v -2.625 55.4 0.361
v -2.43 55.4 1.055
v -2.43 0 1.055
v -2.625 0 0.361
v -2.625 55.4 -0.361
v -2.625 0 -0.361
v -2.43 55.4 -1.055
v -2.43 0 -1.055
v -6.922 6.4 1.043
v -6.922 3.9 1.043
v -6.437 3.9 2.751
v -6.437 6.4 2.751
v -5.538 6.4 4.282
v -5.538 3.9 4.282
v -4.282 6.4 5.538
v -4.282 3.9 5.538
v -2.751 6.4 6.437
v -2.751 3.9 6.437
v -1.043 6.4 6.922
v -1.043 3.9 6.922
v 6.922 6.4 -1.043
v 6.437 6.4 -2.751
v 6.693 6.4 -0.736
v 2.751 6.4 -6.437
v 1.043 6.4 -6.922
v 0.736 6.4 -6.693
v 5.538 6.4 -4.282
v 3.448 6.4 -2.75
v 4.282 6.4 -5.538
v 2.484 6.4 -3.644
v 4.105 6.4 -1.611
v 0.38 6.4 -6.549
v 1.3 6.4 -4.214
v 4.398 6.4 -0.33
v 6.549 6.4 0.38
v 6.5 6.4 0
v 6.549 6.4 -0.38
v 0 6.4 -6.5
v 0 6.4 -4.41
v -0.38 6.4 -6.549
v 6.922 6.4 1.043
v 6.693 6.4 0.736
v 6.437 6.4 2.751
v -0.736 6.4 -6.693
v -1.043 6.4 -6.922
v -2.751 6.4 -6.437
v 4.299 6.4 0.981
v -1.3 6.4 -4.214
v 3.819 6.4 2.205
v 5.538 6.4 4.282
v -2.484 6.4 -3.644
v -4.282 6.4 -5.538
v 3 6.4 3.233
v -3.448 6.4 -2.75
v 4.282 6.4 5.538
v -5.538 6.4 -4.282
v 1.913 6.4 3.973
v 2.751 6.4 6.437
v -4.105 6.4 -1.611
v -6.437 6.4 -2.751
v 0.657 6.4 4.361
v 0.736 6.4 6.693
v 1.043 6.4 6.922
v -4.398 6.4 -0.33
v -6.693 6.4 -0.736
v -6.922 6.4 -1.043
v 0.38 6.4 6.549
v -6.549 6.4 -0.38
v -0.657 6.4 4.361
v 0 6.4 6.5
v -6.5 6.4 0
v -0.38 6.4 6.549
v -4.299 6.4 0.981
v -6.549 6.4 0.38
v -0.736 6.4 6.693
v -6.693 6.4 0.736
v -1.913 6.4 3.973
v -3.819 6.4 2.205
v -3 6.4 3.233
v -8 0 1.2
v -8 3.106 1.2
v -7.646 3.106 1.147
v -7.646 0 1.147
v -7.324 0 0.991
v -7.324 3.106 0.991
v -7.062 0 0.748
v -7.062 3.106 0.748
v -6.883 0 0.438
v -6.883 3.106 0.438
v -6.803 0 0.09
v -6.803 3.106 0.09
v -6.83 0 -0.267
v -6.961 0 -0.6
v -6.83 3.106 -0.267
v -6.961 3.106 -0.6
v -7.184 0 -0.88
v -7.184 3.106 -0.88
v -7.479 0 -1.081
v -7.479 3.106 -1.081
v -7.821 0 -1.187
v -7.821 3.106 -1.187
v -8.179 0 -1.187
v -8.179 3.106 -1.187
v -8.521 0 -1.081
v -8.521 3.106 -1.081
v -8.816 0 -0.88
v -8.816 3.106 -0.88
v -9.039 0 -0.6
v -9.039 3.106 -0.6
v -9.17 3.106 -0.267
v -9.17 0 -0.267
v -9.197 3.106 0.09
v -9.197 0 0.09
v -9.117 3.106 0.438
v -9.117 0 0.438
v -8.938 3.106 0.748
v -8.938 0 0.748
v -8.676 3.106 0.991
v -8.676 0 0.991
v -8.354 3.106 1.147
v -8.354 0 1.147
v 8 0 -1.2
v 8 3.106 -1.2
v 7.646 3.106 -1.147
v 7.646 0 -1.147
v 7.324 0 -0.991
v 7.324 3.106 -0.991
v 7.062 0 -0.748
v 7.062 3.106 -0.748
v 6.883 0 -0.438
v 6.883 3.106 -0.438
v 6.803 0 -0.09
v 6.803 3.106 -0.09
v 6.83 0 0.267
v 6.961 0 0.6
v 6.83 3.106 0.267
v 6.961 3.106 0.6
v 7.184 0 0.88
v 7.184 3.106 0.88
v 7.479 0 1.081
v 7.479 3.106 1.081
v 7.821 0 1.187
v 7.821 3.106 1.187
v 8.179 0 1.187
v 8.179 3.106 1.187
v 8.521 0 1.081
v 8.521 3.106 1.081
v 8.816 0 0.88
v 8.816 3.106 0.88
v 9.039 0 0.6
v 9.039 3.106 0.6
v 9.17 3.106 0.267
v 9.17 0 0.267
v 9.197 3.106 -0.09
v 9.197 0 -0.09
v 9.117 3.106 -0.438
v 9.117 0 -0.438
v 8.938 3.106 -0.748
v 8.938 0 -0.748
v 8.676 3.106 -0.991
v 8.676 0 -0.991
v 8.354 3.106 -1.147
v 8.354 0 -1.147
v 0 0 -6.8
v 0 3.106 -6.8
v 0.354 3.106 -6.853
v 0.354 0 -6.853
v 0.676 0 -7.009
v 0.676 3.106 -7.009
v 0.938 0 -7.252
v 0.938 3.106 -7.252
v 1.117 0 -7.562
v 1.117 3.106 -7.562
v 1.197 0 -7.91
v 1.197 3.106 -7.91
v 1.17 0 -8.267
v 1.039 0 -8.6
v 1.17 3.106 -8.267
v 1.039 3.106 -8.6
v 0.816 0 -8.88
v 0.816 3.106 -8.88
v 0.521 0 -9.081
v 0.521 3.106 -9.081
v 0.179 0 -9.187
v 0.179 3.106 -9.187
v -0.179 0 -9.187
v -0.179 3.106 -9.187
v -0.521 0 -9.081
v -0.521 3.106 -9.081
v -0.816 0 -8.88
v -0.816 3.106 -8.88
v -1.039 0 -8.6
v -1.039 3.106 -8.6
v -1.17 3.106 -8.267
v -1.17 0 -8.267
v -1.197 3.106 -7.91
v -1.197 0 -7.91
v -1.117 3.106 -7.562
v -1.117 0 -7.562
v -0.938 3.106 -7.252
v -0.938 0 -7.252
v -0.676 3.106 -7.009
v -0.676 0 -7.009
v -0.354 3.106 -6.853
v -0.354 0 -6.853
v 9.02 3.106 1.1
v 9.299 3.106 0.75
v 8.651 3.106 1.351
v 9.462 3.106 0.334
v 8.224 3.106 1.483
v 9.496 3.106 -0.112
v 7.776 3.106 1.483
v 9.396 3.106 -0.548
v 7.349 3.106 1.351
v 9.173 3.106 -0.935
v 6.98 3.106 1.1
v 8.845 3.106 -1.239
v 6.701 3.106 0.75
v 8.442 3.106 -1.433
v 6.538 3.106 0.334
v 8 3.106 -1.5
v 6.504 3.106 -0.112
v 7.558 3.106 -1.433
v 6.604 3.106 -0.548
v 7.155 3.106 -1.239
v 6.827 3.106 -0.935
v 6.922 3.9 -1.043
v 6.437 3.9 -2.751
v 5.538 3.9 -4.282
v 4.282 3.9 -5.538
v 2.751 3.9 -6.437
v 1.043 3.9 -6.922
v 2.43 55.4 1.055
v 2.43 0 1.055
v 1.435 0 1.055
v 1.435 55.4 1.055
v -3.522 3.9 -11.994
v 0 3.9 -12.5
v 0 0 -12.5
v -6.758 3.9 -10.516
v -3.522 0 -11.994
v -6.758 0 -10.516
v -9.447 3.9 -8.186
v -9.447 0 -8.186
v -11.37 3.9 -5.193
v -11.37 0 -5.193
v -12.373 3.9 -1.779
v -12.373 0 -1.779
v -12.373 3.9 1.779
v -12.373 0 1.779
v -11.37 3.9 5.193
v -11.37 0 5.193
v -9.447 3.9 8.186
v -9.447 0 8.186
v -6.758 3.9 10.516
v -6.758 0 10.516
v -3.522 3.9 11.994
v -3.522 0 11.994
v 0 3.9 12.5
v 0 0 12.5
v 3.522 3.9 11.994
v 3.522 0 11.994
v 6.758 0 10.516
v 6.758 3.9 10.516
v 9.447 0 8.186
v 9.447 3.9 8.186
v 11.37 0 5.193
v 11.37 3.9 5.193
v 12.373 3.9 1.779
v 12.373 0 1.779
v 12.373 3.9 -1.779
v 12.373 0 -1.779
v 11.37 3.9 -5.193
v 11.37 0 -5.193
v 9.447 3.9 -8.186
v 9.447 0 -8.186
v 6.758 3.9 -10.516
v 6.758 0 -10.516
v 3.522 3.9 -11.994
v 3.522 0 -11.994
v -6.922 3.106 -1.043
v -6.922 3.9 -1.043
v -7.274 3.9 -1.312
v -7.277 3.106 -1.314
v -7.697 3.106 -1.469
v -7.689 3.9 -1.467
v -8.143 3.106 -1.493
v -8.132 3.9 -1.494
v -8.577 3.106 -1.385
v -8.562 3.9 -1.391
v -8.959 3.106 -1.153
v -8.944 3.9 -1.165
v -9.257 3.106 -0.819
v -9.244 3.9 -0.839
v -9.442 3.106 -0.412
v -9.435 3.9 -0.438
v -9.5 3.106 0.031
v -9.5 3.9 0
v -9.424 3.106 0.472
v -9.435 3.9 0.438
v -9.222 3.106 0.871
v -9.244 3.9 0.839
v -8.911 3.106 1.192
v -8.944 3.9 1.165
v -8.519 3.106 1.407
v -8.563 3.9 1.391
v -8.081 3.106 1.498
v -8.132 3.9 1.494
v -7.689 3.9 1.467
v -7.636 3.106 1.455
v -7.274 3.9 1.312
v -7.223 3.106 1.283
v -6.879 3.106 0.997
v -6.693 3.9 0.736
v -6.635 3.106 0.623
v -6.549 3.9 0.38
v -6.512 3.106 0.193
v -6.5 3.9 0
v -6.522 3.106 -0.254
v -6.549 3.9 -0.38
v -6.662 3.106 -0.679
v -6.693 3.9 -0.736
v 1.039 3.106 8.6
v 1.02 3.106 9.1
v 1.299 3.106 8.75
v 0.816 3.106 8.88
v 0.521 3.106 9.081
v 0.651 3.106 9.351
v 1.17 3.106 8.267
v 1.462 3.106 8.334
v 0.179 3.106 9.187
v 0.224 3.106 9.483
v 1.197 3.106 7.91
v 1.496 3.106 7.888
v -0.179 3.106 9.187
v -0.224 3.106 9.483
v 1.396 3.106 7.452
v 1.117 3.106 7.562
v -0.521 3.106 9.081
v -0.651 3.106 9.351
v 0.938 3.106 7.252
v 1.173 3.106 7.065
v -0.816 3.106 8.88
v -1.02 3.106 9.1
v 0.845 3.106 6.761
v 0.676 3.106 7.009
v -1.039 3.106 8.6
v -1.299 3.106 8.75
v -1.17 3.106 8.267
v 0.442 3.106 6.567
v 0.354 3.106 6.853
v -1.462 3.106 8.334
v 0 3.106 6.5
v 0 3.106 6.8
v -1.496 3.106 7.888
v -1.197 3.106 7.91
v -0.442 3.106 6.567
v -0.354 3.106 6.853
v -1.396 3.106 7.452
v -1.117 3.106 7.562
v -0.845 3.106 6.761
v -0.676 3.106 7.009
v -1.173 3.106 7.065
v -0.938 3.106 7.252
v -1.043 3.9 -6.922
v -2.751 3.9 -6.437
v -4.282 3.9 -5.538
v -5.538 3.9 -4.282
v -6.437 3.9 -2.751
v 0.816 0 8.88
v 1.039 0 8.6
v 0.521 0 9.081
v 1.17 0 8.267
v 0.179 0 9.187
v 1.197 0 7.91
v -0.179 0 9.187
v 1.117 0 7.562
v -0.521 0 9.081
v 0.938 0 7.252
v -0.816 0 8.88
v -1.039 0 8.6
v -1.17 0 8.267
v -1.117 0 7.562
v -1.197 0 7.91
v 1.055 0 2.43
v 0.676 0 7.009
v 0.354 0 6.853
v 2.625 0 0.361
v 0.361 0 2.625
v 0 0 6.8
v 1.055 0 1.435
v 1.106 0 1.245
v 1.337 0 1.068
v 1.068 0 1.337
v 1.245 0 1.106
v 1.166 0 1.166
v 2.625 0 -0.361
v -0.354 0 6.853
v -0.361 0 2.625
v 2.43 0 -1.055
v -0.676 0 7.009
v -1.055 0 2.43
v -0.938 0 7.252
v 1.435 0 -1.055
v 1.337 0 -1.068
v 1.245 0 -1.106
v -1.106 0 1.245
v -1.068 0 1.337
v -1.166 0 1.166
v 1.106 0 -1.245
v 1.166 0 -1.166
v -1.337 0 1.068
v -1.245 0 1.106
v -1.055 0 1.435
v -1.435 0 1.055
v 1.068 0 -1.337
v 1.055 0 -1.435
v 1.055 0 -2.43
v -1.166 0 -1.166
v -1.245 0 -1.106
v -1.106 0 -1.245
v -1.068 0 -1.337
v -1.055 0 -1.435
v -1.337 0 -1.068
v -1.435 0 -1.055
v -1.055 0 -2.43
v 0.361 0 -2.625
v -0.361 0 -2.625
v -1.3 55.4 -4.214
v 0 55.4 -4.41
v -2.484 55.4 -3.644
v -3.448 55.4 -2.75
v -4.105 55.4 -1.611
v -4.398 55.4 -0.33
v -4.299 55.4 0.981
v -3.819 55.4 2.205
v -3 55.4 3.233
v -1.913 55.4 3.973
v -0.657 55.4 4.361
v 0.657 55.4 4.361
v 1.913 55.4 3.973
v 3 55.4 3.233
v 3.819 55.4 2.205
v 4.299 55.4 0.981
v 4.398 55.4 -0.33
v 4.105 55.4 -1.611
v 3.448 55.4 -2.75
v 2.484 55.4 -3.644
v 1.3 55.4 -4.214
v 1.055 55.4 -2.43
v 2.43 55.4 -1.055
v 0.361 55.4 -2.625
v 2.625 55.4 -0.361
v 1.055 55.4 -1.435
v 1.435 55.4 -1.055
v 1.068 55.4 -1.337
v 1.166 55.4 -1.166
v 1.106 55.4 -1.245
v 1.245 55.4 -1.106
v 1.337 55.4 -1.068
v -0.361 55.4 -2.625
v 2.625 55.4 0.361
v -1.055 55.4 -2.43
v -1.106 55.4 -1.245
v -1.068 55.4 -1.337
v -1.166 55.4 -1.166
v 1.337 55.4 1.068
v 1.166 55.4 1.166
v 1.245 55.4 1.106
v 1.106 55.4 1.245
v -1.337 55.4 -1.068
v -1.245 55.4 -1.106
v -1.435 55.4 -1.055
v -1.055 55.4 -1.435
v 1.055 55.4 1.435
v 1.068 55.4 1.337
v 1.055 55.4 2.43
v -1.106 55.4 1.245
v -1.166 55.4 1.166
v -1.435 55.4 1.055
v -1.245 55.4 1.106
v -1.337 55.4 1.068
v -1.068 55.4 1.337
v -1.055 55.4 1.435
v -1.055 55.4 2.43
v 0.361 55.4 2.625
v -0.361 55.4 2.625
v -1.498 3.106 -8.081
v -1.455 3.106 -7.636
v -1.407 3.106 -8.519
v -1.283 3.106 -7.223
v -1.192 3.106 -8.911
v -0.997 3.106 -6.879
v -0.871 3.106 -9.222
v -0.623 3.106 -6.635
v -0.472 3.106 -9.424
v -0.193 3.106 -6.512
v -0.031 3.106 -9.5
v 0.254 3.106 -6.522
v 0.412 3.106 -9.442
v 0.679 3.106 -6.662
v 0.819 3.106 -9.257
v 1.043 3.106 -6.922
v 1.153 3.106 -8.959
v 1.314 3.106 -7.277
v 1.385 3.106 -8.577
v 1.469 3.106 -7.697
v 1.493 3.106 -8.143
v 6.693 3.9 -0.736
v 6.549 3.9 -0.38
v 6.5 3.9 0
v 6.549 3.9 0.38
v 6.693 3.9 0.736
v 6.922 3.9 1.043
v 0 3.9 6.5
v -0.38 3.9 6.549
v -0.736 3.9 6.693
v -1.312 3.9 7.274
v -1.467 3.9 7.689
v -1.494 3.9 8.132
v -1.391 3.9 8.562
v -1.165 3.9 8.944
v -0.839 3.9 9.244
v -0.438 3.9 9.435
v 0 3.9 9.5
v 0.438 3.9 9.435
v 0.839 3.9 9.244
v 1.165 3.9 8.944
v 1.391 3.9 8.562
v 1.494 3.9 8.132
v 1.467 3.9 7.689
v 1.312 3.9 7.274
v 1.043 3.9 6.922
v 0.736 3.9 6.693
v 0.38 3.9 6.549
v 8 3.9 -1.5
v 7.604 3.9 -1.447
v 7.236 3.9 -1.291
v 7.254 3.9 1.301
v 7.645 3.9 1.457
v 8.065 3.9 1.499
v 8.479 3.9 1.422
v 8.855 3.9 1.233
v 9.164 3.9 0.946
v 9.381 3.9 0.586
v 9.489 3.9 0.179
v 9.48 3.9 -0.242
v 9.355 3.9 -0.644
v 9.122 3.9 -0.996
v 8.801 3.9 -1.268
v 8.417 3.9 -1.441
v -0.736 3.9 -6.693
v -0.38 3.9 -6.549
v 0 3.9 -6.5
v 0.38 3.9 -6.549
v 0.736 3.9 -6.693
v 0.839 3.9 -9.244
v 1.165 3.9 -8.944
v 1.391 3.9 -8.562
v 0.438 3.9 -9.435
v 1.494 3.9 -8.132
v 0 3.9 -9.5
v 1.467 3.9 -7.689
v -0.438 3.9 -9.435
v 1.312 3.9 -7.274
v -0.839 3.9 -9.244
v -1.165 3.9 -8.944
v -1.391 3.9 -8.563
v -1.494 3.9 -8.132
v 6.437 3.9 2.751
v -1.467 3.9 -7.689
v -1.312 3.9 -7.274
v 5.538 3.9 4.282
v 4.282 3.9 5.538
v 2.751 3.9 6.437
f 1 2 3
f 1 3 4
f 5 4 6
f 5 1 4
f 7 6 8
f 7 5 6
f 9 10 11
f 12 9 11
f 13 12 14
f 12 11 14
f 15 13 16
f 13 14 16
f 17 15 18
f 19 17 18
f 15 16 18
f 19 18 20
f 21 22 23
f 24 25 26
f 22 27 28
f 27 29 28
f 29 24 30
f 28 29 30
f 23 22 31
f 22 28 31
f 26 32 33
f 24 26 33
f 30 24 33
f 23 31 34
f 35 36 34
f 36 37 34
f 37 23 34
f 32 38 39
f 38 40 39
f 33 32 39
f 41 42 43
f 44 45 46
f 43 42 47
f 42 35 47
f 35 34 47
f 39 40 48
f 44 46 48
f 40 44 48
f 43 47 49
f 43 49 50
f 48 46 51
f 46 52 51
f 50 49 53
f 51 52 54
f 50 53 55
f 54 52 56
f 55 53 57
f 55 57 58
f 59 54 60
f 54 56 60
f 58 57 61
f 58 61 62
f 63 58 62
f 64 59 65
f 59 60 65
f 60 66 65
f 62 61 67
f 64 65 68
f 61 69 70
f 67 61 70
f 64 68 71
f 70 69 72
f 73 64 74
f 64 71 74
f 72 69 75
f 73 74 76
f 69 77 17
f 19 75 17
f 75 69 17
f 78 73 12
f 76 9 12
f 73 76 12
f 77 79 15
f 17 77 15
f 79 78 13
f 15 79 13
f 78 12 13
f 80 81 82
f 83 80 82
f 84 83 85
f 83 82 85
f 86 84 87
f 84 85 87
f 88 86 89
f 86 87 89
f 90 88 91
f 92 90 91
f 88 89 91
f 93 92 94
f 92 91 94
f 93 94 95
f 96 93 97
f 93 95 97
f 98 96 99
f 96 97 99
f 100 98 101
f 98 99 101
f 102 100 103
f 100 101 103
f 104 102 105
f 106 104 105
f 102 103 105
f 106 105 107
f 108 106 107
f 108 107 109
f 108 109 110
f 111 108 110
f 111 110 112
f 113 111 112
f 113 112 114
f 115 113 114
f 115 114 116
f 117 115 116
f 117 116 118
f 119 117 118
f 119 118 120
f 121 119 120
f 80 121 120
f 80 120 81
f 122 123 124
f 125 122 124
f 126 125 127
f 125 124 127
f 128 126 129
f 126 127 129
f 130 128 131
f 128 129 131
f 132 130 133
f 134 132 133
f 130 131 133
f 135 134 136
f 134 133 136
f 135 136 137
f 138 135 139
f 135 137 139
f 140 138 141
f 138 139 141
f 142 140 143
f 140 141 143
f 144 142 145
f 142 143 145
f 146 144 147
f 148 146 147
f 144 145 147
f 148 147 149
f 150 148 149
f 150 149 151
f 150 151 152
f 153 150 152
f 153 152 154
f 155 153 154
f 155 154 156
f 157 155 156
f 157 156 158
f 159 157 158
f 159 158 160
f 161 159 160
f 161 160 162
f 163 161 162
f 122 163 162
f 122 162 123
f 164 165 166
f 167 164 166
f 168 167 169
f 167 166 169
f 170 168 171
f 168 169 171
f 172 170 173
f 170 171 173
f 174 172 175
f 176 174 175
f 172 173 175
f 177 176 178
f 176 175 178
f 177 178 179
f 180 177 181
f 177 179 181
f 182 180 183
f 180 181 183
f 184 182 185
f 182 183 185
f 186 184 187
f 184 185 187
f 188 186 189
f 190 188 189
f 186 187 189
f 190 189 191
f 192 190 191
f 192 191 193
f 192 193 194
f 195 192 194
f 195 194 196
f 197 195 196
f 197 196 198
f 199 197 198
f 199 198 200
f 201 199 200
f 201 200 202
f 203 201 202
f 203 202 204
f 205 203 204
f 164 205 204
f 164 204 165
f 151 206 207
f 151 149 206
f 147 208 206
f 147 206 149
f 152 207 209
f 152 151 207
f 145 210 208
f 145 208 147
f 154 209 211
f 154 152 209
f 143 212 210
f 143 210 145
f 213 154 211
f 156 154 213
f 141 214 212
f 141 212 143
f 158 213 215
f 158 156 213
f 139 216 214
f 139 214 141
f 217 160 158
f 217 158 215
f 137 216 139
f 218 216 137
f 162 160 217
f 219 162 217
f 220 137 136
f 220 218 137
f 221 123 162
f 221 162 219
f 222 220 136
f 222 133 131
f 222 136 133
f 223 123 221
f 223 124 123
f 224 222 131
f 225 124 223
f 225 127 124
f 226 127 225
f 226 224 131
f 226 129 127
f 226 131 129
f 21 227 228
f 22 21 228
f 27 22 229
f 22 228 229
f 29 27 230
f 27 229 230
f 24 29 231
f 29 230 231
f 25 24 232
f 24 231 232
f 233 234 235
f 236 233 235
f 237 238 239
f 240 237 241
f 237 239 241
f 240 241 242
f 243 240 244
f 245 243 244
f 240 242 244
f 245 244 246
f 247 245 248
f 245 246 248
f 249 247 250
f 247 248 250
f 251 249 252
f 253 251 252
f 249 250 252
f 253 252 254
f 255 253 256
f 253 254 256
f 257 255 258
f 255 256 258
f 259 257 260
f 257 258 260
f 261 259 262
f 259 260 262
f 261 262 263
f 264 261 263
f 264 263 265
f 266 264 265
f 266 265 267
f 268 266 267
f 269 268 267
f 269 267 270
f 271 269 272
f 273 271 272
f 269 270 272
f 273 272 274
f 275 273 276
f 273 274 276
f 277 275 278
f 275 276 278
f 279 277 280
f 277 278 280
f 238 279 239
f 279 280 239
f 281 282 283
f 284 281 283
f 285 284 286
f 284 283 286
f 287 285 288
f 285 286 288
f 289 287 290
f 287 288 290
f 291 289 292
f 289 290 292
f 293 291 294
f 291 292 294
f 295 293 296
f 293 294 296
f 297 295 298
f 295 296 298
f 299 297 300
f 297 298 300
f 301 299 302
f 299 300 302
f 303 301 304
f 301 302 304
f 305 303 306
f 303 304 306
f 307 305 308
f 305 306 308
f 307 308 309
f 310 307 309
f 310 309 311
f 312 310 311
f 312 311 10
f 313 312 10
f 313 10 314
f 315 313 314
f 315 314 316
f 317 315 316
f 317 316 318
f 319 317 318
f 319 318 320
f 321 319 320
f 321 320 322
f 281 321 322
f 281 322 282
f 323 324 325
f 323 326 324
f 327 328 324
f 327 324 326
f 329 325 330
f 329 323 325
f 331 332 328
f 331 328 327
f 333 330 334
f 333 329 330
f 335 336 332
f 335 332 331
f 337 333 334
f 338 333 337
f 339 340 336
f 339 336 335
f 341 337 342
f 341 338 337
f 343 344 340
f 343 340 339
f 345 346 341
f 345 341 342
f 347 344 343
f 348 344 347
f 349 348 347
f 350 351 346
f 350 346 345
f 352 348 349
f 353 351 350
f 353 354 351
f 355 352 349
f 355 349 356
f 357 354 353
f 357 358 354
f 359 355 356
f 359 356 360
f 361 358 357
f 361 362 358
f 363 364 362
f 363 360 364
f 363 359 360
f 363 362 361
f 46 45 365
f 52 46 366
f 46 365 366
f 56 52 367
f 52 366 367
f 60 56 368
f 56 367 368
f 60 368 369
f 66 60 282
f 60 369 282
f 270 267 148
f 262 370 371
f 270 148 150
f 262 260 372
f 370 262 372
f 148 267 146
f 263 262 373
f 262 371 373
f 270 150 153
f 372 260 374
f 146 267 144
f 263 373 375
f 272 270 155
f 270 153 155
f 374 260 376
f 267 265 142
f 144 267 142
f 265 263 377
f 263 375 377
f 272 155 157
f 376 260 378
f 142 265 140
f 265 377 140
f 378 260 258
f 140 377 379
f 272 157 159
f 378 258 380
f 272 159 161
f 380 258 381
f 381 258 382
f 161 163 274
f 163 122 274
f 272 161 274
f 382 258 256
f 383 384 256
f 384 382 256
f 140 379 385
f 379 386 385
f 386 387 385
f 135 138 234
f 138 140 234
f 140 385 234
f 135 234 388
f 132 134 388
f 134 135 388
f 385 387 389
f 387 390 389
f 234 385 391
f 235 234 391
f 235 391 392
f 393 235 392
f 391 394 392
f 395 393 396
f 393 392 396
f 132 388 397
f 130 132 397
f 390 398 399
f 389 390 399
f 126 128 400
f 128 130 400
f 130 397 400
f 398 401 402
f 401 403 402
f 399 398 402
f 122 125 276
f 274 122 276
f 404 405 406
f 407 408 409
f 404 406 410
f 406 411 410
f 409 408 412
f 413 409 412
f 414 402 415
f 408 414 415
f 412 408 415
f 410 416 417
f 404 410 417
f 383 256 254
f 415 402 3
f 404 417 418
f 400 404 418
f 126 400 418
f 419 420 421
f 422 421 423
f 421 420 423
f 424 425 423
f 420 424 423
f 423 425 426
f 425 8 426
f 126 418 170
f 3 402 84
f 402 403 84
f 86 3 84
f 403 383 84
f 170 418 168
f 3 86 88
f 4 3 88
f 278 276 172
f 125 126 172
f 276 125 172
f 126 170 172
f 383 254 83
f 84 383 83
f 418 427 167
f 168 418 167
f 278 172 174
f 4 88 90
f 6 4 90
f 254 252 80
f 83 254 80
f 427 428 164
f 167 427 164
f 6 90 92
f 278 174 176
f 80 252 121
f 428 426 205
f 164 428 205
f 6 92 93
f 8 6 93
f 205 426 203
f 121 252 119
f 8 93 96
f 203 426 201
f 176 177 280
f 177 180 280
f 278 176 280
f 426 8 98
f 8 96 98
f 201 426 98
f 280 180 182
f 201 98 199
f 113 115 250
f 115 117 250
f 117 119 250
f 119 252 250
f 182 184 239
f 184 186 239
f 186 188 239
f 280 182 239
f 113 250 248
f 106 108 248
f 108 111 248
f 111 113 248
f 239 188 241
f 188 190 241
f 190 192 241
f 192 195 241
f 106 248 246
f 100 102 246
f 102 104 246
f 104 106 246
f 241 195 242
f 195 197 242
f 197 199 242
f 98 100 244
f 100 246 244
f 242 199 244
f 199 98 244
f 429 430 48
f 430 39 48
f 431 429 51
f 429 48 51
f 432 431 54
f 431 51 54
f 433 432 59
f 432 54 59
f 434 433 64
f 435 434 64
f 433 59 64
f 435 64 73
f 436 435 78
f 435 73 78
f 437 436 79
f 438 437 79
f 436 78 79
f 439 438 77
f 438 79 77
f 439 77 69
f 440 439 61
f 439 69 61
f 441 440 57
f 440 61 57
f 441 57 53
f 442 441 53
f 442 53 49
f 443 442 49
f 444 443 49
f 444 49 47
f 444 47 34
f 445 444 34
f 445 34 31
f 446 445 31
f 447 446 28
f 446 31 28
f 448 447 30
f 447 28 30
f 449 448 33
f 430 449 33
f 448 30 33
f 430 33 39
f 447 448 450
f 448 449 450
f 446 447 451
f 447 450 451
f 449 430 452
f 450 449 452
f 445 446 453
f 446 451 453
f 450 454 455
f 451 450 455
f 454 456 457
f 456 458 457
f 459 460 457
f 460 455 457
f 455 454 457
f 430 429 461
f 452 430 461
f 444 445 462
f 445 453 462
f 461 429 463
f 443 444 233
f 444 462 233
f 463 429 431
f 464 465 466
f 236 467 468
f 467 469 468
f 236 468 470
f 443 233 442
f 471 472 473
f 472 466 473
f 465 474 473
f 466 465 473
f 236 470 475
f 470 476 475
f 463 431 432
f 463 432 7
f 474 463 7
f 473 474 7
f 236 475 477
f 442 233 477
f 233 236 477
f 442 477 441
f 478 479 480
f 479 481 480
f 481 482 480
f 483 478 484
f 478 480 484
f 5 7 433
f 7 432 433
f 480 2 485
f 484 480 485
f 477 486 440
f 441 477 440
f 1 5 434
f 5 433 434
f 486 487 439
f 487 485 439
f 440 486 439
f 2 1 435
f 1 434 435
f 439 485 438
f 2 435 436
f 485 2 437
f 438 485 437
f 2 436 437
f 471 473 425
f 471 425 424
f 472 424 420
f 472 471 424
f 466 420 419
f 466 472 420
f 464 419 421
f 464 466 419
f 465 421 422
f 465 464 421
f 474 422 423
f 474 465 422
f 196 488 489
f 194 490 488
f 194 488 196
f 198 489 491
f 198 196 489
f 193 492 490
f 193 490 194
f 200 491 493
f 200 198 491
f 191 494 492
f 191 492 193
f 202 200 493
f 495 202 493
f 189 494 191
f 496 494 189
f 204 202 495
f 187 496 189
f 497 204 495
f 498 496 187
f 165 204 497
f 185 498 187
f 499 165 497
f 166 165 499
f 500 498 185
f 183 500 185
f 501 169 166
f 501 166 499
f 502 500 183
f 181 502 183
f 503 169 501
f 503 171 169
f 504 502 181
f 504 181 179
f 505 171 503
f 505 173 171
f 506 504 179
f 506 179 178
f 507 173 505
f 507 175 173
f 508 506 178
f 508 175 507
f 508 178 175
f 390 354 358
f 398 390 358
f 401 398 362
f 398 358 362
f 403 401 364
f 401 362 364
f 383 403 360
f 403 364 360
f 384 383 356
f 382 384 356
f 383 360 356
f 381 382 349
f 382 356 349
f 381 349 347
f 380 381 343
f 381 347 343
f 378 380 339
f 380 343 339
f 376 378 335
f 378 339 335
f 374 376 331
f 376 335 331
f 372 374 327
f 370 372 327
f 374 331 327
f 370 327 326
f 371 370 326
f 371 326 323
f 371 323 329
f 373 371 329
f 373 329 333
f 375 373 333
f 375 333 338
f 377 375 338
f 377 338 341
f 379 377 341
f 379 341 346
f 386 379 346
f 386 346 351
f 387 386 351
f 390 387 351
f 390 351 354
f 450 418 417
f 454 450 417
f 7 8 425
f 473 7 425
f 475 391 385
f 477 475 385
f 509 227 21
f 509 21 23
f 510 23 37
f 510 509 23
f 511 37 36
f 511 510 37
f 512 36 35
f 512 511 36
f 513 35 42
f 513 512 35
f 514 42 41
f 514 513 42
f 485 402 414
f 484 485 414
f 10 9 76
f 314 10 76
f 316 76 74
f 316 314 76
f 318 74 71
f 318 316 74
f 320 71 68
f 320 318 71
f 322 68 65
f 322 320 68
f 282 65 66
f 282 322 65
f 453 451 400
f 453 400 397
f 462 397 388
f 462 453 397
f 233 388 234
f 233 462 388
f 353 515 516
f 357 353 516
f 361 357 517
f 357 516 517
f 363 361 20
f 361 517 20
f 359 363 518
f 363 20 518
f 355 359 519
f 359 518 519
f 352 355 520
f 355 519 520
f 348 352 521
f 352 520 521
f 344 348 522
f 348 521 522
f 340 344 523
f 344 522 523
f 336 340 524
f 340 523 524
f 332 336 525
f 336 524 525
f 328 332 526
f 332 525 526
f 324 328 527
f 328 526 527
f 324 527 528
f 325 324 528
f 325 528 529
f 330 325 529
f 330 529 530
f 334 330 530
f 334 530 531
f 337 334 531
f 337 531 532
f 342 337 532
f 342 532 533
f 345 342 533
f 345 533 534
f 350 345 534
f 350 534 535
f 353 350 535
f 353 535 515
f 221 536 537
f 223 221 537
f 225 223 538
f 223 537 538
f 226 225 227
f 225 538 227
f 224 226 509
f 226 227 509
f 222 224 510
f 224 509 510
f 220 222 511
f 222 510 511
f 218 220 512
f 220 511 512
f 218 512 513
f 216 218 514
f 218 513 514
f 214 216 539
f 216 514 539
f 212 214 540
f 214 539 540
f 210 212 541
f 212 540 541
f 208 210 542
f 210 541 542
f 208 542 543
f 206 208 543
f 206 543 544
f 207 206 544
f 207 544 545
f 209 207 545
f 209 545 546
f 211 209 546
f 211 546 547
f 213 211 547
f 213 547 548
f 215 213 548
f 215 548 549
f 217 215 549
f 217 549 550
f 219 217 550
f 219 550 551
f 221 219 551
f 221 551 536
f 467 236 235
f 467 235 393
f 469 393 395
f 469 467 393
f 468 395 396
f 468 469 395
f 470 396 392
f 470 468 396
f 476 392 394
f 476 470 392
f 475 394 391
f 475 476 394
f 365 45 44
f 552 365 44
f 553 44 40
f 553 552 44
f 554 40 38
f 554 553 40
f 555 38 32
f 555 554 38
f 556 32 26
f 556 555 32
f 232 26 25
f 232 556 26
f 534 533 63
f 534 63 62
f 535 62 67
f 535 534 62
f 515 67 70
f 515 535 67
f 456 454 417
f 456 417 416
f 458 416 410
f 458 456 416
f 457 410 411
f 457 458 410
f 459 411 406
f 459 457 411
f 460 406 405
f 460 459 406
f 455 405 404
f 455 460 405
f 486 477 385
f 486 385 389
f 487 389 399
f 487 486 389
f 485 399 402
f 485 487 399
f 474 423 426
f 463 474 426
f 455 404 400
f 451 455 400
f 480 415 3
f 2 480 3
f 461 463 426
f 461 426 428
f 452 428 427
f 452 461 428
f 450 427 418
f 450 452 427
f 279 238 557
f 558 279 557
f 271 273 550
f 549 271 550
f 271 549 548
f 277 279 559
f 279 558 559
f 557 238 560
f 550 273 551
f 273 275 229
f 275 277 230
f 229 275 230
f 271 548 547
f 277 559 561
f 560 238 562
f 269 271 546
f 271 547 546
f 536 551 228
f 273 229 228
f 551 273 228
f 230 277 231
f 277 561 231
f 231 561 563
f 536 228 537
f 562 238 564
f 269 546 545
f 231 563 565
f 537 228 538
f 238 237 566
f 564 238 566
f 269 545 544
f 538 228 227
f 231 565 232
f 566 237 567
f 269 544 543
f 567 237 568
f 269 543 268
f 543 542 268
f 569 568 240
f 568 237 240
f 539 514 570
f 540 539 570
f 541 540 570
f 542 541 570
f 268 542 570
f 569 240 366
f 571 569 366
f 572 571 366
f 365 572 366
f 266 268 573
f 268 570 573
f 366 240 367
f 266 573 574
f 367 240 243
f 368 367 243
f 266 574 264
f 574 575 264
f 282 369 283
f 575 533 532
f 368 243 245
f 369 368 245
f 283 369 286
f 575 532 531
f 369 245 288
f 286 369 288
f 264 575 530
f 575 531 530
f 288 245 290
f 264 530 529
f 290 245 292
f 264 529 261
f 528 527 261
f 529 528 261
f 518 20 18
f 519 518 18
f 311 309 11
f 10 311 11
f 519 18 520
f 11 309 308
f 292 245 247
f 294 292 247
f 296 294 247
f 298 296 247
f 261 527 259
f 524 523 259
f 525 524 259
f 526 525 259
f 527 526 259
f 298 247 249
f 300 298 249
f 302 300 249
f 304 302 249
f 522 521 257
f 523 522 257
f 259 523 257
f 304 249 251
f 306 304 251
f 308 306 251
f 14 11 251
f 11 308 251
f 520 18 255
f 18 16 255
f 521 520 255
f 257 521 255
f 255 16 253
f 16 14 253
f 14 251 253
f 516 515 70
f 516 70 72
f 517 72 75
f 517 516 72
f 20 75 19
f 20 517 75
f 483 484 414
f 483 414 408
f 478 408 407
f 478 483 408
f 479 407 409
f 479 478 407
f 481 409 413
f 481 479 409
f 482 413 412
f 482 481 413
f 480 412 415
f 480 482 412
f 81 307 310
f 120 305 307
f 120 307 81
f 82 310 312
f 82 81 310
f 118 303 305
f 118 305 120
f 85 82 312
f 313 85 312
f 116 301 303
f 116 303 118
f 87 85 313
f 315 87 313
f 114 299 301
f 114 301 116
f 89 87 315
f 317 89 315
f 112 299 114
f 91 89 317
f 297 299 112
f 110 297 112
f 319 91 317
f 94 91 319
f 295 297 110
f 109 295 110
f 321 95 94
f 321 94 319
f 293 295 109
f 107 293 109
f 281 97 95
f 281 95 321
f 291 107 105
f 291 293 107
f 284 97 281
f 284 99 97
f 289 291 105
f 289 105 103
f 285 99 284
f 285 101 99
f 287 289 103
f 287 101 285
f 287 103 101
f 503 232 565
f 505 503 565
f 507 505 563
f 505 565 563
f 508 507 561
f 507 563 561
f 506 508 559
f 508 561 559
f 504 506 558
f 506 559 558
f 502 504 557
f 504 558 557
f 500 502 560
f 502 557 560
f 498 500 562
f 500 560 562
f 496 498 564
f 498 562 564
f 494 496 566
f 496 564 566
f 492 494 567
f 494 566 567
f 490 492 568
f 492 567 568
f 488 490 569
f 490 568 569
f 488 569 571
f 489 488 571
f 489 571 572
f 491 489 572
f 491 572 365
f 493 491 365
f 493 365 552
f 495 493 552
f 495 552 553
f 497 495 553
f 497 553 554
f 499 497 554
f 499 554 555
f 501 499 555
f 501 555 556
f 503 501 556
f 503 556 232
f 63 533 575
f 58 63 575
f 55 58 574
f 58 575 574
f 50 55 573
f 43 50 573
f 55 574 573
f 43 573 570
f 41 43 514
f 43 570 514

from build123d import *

# Parameters (mm, degrees)
CUT_EXTRUDE1_REACH             = 60.152
SKETCH3_R                      = 1.5
CUT_EXTRUDE2_DEPTH             = 0.79375
CUT_EXTRUDE2_DIRECTION_2_REACH = 56.45
CUT_EXTRUDE3_REACH             = 56.45
SKETCH5_R                      = 1.2


with BuildPart() as part:
    # Sketch1 → Revolve1 (revolve)
    with BuildSketch(Plane.XY, mode=Mode.PRIVATE) as revolve1_sk:
        Polygon((0, 0), (0, 55.4), (4.41, 55.4), (4.41, 6.4), (7, 6.4), (7, 3.9), (12.5, 3.9), (12.5, 0), align=None)
    revolve(revolve1_sk.sketch.rotate(Axis((0, 0, 0), (0, 1, 0)), 90), axis=Axis((0, 0, 0), (0, 1, 0)))

    # Sketch2 → Cut-Extrude1 (cut, up to next)
    with BuildSketch(Plane(origin=(0, 55.4, 0), x_dir=(1, 0, 0), z_dir=(0, 1, 0)), mode=Mode.PRIVATE) as cut_extrude1_sk1:
        with BuildLine():
            Line((-0.935, -1.435), (-0.935, -2.35))
            ThreePointArc((-0.935, -2.35), (0, -2.529174767), (0.935, -2.35))
            Line((0.935, -2.35), (0.935, -1.435))
            ThreePointArc((0.935, -1.435), (1.081446609, -1.081446609), (1.435, -0.935))
            Line((1.435, -0.935), (2.35, -0.935))
            ThreePointArc((2.35, -0.935), (2.529174767, 0), (2.35, 0.935))
            Line((2.35, 0.935), (1.435, 0.935))
            ThreePointArc((1.435, 0.935), (1.081446609, 1.081446609), (0.935, 1.435))
            Line((0.935, 1.435), (0.935, 2.35))
            ThreePointArc((0.935, 2.35), (0, 2.529174767), (-0.935, 2.35))
            Line((-0.935, 2.35), (-0.935, 1.435))
            ThreePointArc((-0.935, 1.435), (-1.081446609, 1.081446609), (-1.435, 0.935))
            Line((-1.435, 0.935), (-2.35, 0.935))
            ThreePointArc((-2.35, 0.935), (-2.529174767, 0), (-2.35, -0.935))
            Line((-2.35, -0.935), (-1.435, -0.935))
            ThreePointArc((-1.435, -0.935), (-1.081446609, -1.081446609), (-0.935, -1.435))
        make_face()
    cut_extrude1_tool1 = extrude(cut_extrude1_sk1.sketch, amount=-CUT_EXTRUDE1_REACH, mode=Mode.PRIVATE) & part.part
    # Sketch2 → Cut-Extrude1 (cut, up to next)
    with BuildSketch(Plane(origin=(0, 55.4, 0), x_dir=(1, 0, 0), z_dir=(0, 1, 0)), mode=Mode.PRIVATE) as cut_extrude1_sk2:
        with BuildLine():
            Line((1.055, 2.430041552), (1.055, 1.435))
            ThreePointArc((1.055, 1.435), (1.166299423, 1.166299423), (1.435, 1.055))
            Line((1.435, 1.055), (2.430041552, 1.055))
            ThreePointArc((2.430041552, 1.055), (2.649174767, 0), (2.430041552, -1.055))
            Line((2.430041552, -1.055), (1.435, -1.055))
            ThreePointArc((1.435, -1.055), (1.166299423, -1.166299423), (1.055, -1.435))
            Line((1.055, -1.435), (1.055, -2.430041552))
            ThreePointArc((1.055, -2.430041552), (0, -2.649174767), (-1.055, -2.430041552))
            Line((-1.055, -2.430041552), (-1.055, -1.435))
            ThreePointArc((-1.055, -1.435), (-1.166299423, -1.166299423), (-1.435, -1.055))
            Line((-1.435, -1.055), (-2.430041552, -1.055))
            ThreePointArc((-2.430041552, -1.055), (-2.649174767, 0), (-2.430041552, 1.055))
            Line((-2.430041552, 1.055), (-1.435, 1.055))
            ThreePointArc((-1.435, 1.055), (-1.166299423, 1.166299423), (-1.055, 1.435))
            Line((-1.055, 1.435), (-1.055, 2.430041552))
            ThreePointArc((-1.055, 2.430041552), (0, 2.649174767), (1.055, 2.430041552))
        make_face()
    cut_extrude1_tool2 = extrude(cut_extrude1_sk2.sketch, amount=-CUT_EXTRUDE1_REACH, mode=Mode.PRIVATE) & part.part
    add(cut_extrude1_tool1.solids().sort_by_distance((0, 55.4, 0))[0], mode=Mode.SUBTRACT)
    add(cut_extrude1_tool2.solids().sort_by_distance((0, 55.4, 0))[0], mode=Mode.SUBTRACT)

    # Sketch3 → Cut-Extrude2 (cut)
    with BuildSketch(Plane(origin=(0, 3.9, 0), x_dir=(1, 0, 0), z_dir=(0, 1, 0))):
        with Locations(Location((0, 8, 0), (0, 0, 314.048625674))):
            Circle(SKETCH3_R)
        with Locations(Location((0, -8, 0), (0, 0, 90))):
            Circle(SKETCH3_R)
        with Locations(Location((-8, 0, 0), (0, 0, 44.048625674))):
            Circle(SKETCH3_R)
        with Locations(Location((8, 0, 0), (0, 0, 90))):
            Circle(SKETCH3_R)
    extrude(amount=-CUT_EXTRUDE2_DEPTH, mode=Mode.SUBTRACT)

    # Cut-Extrude2 direction 2: up to this face of the body (flat: up to its plane)
    cut_extrude2_direction_2_end = Plane(part.part.faces().sort_by_distance((0, 6.4, 4.607989899))[0])
    # Sketch3 → Cut-Extrude2 direction 2 (cut, up to the picked face)
    with BuildSketch(Plane(origin=(0, 3.9, 0), x_dir=(1, 0, 0), z_dir=(0, 1, 0)), mode=Mode.PRIVATE) as cut_extrude2_direction_2_sk1:
        with Locations(Location((0, 8, 0), (0, 0, 314.048625674))):
            Circle(SKETCH3_R)
    cut_extrude2_direction_2_tool1 = split(extrude(cut_extrude2_direction_2_sk1.sketch, amount=CUT_EXTRUDE2_DIRECTION_2_REACH, mode=Mode.PRIVATE), bisect_by=cut_extrude2_direction_2_end, keep=Keep.BOTH, mode=Mode.PRIVATE)
    # Sketch3 → Cut-Extrude2 direction 2 (cut, up to the picked face)
    with BuildSketch(Plane(origin=(0, 3.9, 0), x_dir=(1, 0, 0), z_dir=(0, 1, 0)), mode=Mode.PRIVATE) as cut_extrude2_direction_2_sk2:
        with Locations(Location((0, -8, 0), (0, 0, 90))):
            Circle(SKETCH3_R)
    cut_extrude2_direction_2_tool2 = split(extrude(cut_extrude2_direction_2_sk2.sketch, amount=CUT_EXTRUDE2_DIRECTION_2_REACH, mode=Mode.PRIVATE), bisect_by=cut_extrude2_direction_2_end, keep=Keep.BOTH, mode=Mode.PRIVATE)
    # Sketch3 → Cut-Extrude2 direction 2 (cut, up to the picked face)
    with BuildSketch(Plane(origin=(0, 3.9, 0), x_dir=(1, 0, 0), z_dir=(0, 1, 0)), mode=Mode.PRIVATE) as cut_extrude2_direction_2_sk3:
        with Locations(Location((-8, 0, 0), (0, 0, 44.048625674))):
            Circle(SKETCH3_R)
    cut_extrude2_direction_2_tool3 = split(extrude(cut_extrude2_direction_2_sk3.sketch, amount=CUT_EXTRUDE2_DIRECTION_2_REACH, mode=Mode.PRIVATE), bisect_by=cut_extrude2_direction_2_end, keep=Keep.BOTH, mode=Mode.PRIVATE)
    # Sketch3 → Cut-Extrude2 direction 2 (cut, up to the picked face)
    with BuildSketch(Plane(origin=(0, 3.9, 0), x_dir=(1, 0, 0), z_dir=(0, 1, 0)), mode=Mode.PRIVATE) as cut_extrude2_direction_2_sk4:
        with Locations(Location((8, 0, 0), (0, 0, 90))):
            Circle(SKETCH3_R)
    cut_extrude2_direction_2_tool4 = split(extrude(cut_extrude2_direction_2_sk4.sketch, amount=CUT_EXTRUDE2_DIRECTION_2_REACH, mode=Mode.PRIVATE), bisect_by=cut_extrude2_direction_2_end, keep=Keep.BOTH, mode=Mode.PRIVATE)
    add(cut_extrude2_direction_2_tool1.solids().sort_by(Axis((0, 3.9, -8), (0, 1, 0)))[0], mode=Mode.SUBTRACT)
    add(cut_extrude2_direction_2_tool2.solids().sort_by(Axis((0, 3.9, 8), (0, 1, 0)))[0], mode=Mode.SUBTRACT)
    add(cut_extrude2_direction_2_tool3.solids().sort_by(Axis((-8, 3.9, 0), (0, 1, 0)))[0], mode=Mode.SUBTRACT)
    add(cut_extrude2_direction_2_tool4.solids().sort_by(Axis((8, 3.9, 0), (0, 1, 0)))[0], mode=Mode.SUBTRACT)

    # Sketch5 → Cut-Extrude3 (cut, up to next)
    with BuildSketch(Plane(origin=(0, 3.9, 0), x_dir=(1, 0, 0), z_dir=(0, 1, 0)), mode=Mode.PRIVATE) as cut_extrude3_sk1:
        with Locations(Location((8, 0, 0), (0, 0, 90))):
            Circle(SKETCH5_R)
    cut_extrude3_tool1 = extrude(cut_extrude3_sk1.sketch, amount=-CUT_EXTRUDE3_REACH, mode=Mode.PRIVATE) & part.part
    # Sketch5 → Cut-Extrude3 (cut, up to next)
    with BuildSketch(Plane(origin=(0, 3.9, 0), x_dir=(1, 0, 0), z_dir=(0, 1, 0)), mode=Mode.PRIVATE) as cut_extrude3_sk2:
        with Locations(Location((0, 8, 0), (0, 0, 270))):
            Circle(SKETCH5_R)
    cut_extrude3_tool2 = extrude(cut_extrude3_sk2.sketch, amount=-CUT_EXTRUDE3_REACH, mode=Mode.PRIVATE) & part.part
    # Sketch5 → Cut-Extrude3 (cut, up to next)
    with BuildSketch(Plane(origin=(0, 3.9, 0), x_dir=(1, 0, 0), z_dir=(0, 1, 0)), mode=Mode.PRIVATE) as cut_extrude3_sk3:
        with Locations(Location((-8, 0, 0), (0, 0, 270))):
            Circle(SKETCH5_R)
    cut_extrude3_tool3 = extrude(cut_extrude3_sk3.sketch, amount=-CUT_EXTRUDE3_REACH, mode=Mode.PRIVATE) & part.part
    # Sketch5 → Cut-Extrude3 (cut, up to next)
    with BuildSketch(Plane(origin=(0, 3.9, 0), x_dir=(1, 0, 0), z_dir=(0, 1, 0)), mode=Mode.PRIVATE) as cut_extrude3_sk4:
        with Locations(Location((0, -8, 0), (0, 0, 90))):
            Circle(SKETCH5_R)
    cut_extrude3_tool4 = extrude(cut_extrude3_sk4.sketch, amount=-CUT_EXTRUDE3_REACH, mode=Mode.PRIVATE) & part.part
    add(cut_extrude3_tool1.solids().sort_by_distance((8, 3.9, 0))[0], mode=Mode.SUBTRACT)
    add(cut_extrude3_tool2.solids().sort_by_distance((0, 3.9, -8))[0], mode=Mode.SUBTRACT)
    add(cut_extrude3_tool3.solids().sort_by_distance((-8, 3.9, 0))[0], mode=Mode.SUBTRACT)
    add(cut_extrude3_tool4.solids().sort_by_distance((0, 3.9, 8))[0], mode=Mode.SUBTRACT)


solid = part.part
